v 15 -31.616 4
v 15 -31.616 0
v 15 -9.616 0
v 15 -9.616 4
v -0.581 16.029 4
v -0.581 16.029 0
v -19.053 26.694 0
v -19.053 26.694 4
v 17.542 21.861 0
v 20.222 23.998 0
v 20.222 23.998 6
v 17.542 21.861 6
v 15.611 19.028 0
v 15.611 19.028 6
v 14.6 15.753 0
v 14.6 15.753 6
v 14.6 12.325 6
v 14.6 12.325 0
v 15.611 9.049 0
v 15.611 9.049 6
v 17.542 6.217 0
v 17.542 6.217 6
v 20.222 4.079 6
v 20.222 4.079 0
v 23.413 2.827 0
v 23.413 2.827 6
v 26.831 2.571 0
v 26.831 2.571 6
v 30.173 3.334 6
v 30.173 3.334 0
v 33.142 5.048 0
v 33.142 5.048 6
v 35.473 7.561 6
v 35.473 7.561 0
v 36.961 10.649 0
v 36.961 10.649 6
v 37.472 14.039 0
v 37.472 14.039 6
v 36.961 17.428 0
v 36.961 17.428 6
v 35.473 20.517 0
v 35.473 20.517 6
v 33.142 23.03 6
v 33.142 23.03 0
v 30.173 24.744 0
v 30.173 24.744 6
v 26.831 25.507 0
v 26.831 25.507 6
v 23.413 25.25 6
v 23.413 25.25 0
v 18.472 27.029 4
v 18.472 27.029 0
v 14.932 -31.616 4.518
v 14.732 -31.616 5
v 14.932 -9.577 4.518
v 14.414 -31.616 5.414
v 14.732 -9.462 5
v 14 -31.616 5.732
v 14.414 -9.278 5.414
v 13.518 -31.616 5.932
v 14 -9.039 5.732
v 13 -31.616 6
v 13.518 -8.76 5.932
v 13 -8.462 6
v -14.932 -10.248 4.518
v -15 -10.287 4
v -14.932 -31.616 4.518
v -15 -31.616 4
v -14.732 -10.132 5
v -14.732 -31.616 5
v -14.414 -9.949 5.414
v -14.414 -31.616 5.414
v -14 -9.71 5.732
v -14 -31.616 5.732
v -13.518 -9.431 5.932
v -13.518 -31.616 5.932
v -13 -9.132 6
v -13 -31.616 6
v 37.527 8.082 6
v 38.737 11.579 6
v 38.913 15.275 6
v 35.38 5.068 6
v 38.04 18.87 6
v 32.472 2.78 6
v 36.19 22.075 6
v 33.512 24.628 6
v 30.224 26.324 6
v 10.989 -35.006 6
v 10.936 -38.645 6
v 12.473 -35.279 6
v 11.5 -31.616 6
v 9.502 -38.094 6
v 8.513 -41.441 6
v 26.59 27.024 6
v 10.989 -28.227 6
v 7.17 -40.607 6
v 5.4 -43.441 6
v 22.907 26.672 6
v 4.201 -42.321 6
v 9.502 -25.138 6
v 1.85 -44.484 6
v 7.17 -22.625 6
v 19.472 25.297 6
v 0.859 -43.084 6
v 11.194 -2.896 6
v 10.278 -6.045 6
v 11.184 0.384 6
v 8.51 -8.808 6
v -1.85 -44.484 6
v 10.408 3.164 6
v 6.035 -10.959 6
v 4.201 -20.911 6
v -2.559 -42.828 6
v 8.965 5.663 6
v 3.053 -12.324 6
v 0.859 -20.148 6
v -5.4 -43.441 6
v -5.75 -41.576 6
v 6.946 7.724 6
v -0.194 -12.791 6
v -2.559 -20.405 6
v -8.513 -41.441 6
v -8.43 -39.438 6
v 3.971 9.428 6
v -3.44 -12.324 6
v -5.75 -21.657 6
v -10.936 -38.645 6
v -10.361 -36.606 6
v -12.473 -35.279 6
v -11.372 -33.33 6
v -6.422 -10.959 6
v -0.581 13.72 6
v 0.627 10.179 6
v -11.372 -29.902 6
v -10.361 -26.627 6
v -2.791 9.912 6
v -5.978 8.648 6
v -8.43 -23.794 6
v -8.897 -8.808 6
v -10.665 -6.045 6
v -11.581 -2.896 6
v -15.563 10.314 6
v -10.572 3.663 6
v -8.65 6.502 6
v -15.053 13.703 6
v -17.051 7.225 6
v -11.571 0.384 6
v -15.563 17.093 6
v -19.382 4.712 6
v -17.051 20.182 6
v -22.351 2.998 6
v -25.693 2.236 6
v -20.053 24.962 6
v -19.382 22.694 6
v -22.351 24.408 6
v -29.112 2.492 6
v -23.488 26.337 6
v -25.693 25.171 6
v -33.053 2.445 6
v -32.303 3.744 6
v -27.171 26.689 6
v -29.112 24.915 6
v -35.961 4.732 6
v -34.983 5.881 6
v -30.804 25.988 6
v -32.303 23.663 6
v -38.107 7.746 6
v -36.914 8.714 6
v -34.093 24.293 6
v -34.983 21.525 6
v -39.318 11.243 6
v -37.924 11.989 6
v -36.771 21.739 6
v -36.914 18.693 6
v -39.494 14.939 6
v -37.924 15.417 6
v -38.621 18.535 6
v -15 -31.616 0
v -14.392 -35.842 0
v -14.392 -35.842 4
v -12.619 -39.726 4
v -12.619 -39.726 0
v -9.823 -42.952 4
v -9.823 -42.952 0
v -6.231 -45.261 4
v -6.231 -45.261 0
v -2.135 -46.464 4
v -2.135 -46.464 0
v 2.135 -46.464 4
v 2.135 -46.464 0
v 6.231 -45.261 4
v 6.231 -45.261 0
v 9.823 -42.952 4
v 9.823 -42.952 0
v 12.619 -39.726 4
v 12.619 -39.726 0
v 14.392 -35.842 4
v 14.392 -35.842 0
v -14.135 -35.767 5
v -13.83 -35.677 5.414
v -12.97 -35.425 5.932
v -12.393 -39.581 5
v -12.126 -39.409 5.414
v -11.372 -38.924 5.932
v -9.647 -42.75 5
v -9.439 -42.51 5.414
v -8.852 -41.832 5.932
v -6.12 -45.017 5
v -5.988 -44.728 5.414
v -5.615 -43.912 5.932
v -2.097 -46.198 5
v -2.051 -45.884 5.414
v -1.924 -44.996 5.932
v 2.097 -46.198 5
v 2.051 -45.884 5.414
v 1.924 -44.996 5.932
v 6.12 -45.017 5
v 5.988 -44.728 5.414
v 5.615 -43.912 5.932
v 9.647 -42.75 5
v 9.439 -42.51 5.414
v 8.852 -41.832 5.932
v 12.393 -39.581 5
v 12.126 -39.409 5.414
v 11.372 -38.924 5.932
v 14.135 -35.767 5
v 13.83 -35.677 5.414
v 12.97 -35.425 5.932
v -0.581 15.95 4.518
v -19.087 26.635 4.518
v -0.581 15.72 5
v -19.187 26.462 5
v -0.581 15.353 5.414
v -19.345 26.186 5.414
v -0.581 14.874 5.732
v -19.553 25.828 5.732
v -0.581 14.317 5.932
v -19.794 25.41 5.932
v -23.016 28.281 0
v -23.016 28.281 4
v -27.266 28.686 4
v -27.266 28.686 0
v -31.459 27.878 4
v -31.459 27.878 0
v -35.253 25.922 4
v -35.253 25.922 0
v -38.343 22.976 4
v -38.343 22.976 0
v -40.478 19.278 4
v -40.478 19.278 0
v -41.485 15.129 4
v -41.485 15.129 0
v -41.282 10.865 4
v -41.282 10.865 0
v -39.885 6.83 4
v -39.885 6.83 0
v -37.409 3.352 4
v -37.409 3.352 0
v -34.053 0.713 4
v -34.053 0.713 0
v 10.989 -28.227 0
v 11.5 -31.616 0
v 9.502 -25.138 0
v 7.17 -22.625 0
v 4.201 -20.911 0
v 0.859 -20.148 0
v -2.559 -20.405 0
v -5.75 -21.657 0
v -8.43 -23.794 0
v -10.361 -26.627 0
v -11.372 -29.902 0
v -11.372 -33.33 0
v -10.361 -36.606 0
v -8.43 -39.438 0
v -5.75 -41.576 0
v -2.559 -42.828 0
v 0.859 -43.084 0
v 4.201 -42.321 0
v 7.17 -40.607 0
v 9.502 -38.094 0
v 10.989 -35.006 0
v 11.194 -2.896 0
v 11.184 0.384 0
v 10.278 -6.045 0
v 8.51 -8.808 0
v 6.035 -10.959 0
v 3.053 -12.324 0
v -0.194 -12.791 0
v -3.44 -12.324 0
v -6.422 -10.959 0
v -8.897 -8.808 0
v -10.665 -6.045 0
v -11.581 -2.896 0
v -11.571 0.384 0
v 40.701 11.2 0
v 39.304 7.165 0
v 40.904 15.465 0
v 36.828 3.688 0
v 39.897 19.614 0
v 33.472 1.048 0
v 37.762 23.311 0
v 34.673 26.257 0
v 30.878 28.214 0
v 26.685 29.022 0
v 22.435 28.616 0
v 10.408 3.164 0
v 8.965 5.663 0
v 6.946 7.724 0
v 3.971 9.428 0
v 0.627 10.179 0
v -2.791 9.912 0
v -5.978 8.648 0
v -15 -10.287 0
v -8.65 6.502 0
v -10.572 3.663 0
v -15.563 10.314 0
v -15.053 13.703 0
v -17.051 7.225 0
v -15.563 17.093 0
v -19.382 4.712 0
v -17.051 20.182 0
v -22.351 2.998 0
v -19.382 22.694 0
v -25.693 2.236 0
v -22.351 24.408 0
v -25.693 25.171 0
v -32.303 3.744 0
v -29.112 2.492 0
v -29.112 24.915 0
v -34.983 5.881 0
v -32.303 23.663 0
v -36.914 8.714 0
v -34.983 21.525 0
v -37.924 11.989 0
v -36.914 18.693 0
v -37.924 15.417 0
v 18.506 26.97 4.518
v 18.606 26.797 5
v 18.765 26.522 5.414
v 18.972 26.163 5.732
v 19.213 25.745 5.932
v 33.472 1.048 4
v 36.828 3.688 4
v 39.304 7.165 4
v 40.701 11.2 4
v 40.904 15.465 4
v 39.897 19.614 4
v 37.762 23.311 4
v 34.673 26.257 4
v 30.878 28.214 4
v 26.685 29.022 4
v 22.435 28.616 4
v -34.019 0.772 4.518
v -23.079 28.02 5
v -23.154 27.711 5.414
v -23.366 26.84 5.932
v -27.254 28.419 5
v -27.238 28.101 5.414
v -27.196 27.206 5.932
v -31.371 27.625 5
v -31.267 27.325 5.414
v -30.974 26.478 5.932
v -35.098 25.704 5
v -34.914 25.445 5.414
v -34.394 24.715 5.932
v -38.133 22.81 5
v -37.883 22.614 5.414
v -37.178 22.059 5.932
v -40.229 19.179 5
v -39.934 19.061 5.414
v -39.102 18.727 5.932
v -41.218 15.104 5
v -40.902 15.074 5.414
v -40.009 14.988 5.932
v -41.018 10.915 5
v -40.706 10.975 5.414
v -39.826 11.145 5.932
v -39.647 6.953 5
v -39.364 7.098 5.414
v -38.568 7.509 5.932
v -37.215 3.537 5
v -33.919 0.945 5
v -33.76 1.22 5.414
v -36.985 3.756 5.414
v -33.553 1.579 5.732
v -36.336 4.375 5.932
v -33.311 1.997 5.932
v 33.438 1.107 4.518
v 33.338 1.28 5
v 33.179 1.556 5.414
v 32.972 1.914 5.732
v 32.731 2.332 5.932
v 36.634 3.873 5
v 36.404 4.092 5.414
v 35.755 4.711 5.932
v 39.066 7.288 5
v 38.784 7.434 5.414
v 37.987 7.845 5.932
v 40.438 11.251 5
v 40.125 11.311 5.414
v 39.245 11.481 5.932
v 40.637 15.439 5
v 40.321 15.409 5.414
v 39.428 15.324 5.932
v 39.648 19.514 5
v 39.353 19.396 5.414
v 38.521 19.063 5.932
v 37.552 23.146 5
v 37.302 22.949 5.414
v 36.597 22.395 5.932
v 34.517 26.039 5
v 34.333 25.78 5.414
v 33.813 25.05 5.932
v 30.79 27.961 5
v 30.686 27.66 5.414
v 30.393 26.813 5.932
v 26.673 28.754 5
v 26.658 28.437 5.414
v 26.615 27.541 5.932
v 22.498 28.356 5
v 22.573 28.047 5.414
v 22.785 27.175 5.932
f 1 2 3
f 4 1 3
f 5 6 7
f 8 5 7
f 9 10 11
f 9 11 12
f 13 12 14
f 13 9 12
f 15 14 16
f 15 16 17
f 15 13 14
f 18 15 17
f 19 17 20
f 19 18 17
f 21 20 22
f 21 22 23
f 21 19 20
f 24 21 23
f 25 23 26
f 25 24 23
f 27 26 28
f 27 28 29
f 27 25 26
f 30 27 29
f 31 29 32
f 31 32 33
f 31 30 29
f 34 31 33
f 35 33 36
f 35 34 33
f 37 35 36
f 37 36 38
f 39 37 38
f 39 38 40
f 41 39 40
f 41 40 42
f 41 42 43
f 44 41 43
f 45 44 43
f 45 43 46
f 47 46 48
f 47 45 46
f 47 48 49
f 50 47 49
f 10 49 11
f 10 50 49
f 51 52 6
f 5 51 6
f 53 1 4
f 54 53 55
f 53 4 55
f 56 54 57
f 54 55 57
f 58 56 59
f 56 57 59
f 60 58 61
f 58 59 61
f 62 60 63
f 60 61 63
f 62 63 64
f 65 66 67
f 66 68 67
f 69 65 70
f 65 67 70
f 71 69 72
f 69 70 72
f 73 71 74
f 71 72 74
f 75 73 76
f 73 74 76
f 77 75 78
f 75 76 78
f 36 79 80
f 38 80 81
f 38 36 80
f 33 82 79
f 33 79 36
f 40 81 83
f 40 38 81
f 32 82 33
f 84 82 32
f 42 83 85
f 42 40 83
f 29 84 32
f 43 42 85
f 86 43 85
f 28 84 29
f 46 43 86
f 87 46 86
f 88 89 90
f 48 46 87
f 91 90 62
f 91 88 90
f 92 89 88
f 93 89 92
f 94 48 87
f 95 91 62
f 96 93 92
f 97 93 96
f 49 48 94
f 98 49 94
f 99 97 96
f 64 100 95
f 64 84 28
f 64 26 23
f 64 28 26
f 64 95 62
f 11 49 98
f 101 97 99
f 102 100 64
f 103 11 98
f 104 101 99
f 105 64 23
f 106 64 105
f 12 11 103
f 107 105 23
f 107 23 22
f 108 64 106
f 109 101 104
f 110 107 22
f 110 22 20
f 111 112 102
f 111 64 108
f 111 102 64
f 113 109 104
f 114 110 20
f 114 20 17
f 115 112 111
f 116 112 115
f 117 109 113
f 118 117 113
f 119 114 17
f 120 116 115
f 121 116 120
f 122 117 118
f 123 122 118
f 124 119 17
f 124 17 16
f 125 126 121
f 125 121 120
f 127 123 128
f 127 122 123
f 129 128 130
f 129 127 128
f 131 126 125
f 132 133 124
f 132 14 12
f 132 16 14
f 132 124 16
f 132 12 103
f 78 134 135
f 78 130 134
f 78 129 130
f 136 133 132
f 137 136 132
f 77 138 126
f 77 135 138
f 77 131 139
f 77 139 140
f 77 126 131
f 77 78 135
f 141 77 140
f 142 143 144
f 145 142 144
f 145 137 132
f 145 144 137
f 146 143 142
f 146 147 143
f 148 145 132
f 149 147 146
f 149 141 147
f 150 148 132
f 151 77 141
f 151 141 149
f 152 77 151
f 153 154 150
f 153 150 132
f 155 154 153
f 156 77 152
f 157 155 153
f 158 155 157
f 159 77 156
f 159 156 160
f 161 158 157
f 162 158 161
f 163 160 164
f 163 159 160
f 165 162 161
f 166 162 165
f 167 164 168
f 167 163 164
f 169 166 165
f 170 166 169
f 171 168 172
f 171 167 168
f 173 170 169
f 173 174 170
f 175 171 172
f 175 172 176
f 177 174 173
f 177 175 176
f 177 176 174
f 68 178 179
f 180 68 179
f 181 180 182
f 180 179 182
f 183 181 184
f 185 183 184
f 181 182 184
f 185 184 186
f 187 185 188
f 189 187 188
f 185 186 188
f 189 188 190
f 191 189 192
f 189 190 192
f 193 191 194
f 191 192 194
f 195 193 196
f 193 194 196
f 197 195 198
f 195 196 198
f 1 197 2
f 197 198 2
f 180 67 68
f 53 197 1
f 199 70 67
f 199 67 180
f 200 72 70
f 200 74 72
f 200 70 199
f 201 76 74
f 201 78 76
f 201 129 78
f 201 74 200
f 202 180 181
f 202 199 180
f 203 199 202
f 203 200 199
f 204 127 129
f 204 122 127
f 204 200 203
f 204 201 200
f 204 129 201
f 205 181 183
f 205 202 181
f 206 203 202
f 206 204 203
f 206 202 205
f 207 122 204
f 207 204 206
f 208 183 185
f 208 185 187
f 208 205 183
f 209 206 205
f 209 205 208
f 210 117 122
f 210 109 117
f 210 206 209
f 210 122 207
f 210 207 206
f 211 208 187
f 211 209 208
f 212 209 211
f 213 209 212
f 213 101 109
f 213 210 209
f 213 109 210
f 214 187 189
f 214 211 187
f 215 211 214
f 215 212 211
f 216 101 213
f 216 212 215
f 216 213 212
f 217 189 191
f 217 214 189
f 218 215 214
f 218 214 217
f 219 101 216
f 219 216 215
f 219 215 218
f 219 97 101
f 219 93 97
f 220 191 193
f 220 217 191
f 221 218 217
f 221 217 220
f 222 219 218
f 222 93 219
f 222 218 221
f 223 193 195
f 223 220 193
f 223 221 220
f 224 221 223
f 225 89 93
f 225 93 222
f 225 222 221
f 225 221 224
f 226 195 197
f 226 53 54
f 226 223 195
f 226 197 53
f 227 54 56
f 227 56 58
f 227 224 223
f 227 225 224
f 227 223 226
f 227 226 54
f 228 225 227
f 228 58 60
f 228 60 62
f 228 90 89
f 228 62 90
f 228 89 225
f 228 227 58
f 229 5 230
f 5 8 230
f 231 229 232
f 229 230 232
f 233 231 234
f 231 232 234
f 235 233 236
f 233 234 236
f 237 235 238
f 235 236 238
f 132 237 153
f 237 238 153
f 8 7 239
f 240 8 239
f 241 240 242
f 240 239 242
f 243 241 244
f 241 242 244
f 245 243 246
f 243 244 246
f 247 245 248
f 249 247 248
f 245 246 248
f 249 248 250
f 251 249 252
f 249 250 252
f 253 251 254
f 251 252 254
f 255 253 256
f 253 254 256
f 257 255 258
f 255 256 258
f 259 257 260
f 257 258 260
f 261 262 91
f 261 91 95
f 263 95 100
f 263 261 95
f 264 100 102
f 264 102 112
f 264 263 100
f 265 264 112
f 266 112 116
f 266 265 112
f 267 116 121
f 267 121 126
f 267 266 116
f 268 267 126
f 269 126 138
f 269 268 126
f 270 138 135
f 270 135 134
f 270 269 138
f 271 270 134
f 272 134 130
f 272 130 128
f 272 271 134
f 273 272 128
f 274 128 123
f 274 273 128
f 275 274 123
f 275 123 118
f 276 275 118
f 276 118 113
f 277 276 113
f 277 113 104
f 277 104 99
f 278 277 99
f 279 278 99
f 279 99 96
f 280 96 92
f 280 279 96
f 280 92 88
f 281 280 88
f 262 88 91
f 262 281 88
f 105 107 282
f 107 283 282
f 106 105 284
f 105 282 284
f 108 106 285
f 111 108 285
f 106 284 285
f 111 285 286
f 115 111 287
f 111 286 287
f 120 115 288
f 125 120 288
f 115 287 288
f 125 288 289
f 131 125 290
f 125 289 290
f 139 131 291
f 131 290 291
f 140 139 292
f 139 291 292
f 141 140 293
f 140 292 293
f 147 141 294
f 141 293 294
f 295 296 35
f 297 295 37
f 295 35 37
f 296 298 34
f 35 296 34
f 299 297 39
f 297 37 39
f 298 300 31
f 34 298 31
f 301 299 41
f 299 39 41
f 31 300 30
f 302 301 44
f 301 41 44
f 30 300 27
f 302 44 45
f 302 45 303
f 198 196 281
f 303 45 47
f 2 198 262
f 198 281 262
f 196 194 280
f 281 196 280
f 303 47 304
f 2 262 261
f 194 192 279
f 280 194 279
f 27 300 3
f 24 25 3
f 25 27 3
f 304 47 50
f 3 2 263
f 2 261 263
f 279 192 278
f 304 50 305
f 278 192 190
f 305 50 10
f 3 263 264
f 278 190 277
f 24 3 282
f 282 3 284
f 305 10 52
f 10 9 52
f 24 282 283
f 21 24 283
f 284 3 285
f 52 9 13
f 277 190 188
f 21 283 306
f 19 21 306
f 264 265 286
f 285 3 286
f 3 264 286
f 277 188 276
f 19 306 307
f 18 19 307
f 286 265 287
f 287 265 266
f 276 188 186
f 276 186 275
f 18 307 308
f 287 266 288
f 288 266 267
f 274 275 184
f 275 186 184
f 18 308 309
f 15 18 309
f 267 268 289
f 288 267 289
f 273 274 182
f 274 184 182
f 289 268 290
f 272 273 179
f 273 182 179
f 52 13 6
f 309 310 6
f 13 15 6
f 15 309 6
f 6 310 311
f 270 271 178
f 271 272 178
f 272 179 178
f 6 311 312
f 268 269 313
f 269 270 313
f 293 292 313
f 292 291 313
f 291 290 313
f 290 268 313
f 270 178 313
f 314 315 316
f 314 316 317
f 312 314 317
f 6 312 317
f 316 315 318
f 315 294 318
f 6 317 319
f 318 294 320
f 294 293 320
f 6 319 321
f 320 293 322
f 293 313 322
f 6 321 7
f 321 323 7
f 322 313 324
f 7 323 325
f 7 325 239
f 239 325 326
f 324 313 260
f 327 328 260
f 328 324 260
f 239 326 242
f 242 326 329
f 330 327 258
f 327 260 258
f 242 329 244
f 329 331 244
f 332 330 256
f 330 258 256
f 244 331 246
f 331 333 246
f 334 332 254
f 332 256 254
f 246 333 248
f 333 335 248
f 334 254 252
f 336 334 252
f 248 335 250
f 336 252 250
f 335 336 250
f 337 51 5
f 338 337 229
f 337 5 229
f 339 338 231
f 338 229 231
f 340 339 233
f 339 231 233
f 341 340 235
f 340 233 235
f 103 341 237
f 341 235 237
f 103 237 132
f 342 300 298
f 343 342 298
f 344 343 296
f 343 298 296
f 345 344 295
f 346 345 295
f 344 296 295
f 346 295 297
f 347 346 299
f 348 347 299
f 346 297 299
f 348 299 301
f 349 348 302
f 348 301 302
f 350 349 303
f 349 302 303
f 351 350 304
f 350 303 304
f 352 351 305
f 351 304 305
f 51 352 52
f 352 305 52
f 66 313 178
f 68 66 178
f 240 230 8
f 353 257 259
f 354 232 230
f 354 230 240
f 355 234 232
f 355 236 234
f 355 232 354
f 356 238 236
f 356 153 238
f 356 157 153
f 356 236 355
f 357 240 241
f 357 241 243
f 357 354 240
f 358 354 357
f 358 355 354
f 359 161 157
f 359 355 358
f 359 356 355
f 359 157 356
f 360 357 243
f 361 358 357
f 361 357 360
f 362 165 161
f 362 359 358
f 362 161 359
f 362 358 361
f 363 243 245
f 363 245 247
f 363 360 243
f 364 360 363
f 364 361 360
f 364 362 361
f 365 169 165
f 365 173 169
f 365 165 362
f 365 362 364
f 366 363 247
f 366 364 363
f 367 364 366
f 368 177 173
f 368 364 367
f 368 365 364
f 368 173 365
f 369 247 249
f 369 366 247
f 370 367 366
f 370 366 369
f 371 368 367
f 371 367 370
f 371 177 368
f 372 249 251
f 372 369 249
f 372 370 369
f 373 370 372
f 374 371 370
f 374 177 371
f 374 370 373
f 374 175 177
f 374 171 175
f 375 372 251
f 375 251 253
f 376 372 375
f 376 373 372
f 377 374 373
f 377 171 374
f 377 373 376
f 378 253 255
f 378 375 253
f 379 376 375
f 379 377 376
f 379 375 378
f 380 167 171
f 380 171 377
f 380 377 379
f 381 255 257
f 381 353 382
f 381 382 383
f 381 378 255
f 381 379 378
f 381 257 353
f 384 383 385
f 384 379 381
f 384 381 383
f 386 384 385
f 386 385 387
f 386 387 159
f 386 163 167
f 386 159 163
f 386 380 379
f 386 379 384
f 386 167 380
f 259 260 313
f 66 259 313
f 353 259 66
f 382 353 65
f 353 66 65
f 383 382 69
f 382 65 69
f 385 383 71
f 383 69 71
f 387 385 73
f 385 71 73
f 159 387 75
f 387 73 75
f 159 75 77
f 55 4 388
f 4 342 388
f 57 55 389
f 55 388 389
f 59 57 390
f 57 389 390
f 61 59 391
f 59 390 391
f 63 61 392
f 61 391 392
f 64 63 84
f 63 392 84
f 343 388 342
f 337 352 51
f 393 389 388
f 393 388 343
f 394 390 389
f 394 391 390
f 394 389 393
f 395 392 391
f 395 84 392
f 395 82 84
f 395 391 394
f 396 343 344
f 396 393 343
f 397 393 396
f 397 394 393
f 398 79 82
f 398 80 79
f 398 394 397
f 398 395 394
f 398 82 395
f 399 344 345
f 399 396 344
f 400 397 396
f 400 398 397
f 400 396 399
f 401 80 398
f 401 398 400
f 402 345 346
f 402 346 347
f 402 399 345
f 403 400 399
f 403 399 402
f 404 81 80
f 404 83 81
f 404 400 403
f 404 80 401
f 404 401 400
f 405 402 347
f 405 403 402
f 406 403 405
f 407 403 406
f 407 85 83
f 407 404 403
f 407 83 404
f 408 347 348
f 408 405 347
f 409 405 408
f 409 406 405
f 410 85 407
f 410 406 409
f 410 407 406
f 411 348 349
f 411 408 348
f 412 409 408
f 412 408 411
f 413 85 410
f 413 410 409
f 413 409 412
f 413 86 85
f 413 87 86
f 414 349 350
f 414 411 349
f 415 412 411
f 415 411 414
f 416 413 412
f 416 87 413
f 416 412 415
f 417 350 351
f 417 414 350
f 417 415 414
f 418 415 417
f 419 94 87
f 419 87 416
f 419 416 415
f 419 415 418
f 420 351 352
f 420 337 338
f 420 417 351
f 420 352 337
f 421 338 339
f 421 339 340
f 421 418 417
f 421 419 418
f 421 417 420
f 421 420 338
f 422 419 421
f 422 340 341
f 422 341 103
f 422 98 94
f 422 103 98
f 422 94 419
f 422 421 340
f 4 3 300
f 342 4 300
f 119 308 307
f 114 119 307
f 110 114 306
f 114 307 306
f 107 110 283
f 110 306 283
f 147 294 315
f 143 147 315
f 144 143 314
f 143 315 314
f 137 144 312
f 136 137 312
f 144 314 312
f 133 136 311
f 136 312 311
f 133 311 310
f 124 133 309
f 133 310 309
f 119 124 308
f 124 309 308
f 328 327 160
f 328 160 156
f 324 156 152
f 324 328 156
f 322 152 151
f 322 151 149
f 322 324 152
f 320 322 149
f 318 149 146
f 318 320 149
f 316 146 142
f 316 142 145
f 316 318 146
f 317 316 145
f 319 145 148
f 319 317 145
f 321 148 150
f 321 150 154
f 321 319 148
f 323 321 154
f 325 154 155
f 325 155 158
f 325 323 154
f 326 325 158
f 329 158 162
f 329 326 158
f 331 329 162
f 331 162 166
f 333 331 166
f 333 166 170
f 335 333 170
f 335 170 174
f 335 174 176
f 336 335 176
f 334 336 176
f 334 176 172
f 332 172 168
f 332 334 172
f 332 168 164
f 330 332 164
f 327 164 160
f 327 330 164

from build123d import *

# Parameters (mm, degrees)
F0_R     = 11.5
F1_DEPTH = 6
F2_COUNT = 3
F3_R     = 2


with BuildPart() as f1:
    # F0 (on Top) → F1 (new body)
    with BuildSketch(Plane.XY):
        with BuildLine():
            Line((15, -31.6162464206), (15, 0.3837535794))
            Line((15, 0.3837535794), (11.1837159736, 0.3837535794))
            ThreePointArc((11.1837159736, 0.3837535794), (-0.1936308108, -12.7913524315), (-11.5709775952, 0.3837535794))
            Line((-11.5709775952, 0.3837535794), (-15, 0.3837535794))
            Line((-15, 0.3837535794), (-15, -31.6162464206))
            ThreePointArc((-15, -31.6162464206), (0, -46.6162464206), (15, -31.6162464206))
        make_face()
        with Locations((0, -31.6162464206)):
            Circle(F0_R, mode=Mode.SUBTRACT)
    extrude(amount=F1_DEPTH)

    # F2: F1 ×3 about axis
    f2_axis = Axis((-0.1936308108, -1.2913524315, 0), (0, 0, -1))


with BuildPart() as f1_1:
    add(f1.part)
    for i in range(1, F2_COUNT):
        add(f1.part.rotate(f2_axis, i * 360 / F2_COUNT))

    # F3
    f3_edges = [f1_1.edges().sort_by_distance(p)[0] for p in [
        (8.945395, 21.52916, 6),
        (-24.526287, -4.78698, 6),
        (15, -20.616237, 6),
    ]]
    fillet(f3_edges, radius=F3_R)


solid = f1_1.part
